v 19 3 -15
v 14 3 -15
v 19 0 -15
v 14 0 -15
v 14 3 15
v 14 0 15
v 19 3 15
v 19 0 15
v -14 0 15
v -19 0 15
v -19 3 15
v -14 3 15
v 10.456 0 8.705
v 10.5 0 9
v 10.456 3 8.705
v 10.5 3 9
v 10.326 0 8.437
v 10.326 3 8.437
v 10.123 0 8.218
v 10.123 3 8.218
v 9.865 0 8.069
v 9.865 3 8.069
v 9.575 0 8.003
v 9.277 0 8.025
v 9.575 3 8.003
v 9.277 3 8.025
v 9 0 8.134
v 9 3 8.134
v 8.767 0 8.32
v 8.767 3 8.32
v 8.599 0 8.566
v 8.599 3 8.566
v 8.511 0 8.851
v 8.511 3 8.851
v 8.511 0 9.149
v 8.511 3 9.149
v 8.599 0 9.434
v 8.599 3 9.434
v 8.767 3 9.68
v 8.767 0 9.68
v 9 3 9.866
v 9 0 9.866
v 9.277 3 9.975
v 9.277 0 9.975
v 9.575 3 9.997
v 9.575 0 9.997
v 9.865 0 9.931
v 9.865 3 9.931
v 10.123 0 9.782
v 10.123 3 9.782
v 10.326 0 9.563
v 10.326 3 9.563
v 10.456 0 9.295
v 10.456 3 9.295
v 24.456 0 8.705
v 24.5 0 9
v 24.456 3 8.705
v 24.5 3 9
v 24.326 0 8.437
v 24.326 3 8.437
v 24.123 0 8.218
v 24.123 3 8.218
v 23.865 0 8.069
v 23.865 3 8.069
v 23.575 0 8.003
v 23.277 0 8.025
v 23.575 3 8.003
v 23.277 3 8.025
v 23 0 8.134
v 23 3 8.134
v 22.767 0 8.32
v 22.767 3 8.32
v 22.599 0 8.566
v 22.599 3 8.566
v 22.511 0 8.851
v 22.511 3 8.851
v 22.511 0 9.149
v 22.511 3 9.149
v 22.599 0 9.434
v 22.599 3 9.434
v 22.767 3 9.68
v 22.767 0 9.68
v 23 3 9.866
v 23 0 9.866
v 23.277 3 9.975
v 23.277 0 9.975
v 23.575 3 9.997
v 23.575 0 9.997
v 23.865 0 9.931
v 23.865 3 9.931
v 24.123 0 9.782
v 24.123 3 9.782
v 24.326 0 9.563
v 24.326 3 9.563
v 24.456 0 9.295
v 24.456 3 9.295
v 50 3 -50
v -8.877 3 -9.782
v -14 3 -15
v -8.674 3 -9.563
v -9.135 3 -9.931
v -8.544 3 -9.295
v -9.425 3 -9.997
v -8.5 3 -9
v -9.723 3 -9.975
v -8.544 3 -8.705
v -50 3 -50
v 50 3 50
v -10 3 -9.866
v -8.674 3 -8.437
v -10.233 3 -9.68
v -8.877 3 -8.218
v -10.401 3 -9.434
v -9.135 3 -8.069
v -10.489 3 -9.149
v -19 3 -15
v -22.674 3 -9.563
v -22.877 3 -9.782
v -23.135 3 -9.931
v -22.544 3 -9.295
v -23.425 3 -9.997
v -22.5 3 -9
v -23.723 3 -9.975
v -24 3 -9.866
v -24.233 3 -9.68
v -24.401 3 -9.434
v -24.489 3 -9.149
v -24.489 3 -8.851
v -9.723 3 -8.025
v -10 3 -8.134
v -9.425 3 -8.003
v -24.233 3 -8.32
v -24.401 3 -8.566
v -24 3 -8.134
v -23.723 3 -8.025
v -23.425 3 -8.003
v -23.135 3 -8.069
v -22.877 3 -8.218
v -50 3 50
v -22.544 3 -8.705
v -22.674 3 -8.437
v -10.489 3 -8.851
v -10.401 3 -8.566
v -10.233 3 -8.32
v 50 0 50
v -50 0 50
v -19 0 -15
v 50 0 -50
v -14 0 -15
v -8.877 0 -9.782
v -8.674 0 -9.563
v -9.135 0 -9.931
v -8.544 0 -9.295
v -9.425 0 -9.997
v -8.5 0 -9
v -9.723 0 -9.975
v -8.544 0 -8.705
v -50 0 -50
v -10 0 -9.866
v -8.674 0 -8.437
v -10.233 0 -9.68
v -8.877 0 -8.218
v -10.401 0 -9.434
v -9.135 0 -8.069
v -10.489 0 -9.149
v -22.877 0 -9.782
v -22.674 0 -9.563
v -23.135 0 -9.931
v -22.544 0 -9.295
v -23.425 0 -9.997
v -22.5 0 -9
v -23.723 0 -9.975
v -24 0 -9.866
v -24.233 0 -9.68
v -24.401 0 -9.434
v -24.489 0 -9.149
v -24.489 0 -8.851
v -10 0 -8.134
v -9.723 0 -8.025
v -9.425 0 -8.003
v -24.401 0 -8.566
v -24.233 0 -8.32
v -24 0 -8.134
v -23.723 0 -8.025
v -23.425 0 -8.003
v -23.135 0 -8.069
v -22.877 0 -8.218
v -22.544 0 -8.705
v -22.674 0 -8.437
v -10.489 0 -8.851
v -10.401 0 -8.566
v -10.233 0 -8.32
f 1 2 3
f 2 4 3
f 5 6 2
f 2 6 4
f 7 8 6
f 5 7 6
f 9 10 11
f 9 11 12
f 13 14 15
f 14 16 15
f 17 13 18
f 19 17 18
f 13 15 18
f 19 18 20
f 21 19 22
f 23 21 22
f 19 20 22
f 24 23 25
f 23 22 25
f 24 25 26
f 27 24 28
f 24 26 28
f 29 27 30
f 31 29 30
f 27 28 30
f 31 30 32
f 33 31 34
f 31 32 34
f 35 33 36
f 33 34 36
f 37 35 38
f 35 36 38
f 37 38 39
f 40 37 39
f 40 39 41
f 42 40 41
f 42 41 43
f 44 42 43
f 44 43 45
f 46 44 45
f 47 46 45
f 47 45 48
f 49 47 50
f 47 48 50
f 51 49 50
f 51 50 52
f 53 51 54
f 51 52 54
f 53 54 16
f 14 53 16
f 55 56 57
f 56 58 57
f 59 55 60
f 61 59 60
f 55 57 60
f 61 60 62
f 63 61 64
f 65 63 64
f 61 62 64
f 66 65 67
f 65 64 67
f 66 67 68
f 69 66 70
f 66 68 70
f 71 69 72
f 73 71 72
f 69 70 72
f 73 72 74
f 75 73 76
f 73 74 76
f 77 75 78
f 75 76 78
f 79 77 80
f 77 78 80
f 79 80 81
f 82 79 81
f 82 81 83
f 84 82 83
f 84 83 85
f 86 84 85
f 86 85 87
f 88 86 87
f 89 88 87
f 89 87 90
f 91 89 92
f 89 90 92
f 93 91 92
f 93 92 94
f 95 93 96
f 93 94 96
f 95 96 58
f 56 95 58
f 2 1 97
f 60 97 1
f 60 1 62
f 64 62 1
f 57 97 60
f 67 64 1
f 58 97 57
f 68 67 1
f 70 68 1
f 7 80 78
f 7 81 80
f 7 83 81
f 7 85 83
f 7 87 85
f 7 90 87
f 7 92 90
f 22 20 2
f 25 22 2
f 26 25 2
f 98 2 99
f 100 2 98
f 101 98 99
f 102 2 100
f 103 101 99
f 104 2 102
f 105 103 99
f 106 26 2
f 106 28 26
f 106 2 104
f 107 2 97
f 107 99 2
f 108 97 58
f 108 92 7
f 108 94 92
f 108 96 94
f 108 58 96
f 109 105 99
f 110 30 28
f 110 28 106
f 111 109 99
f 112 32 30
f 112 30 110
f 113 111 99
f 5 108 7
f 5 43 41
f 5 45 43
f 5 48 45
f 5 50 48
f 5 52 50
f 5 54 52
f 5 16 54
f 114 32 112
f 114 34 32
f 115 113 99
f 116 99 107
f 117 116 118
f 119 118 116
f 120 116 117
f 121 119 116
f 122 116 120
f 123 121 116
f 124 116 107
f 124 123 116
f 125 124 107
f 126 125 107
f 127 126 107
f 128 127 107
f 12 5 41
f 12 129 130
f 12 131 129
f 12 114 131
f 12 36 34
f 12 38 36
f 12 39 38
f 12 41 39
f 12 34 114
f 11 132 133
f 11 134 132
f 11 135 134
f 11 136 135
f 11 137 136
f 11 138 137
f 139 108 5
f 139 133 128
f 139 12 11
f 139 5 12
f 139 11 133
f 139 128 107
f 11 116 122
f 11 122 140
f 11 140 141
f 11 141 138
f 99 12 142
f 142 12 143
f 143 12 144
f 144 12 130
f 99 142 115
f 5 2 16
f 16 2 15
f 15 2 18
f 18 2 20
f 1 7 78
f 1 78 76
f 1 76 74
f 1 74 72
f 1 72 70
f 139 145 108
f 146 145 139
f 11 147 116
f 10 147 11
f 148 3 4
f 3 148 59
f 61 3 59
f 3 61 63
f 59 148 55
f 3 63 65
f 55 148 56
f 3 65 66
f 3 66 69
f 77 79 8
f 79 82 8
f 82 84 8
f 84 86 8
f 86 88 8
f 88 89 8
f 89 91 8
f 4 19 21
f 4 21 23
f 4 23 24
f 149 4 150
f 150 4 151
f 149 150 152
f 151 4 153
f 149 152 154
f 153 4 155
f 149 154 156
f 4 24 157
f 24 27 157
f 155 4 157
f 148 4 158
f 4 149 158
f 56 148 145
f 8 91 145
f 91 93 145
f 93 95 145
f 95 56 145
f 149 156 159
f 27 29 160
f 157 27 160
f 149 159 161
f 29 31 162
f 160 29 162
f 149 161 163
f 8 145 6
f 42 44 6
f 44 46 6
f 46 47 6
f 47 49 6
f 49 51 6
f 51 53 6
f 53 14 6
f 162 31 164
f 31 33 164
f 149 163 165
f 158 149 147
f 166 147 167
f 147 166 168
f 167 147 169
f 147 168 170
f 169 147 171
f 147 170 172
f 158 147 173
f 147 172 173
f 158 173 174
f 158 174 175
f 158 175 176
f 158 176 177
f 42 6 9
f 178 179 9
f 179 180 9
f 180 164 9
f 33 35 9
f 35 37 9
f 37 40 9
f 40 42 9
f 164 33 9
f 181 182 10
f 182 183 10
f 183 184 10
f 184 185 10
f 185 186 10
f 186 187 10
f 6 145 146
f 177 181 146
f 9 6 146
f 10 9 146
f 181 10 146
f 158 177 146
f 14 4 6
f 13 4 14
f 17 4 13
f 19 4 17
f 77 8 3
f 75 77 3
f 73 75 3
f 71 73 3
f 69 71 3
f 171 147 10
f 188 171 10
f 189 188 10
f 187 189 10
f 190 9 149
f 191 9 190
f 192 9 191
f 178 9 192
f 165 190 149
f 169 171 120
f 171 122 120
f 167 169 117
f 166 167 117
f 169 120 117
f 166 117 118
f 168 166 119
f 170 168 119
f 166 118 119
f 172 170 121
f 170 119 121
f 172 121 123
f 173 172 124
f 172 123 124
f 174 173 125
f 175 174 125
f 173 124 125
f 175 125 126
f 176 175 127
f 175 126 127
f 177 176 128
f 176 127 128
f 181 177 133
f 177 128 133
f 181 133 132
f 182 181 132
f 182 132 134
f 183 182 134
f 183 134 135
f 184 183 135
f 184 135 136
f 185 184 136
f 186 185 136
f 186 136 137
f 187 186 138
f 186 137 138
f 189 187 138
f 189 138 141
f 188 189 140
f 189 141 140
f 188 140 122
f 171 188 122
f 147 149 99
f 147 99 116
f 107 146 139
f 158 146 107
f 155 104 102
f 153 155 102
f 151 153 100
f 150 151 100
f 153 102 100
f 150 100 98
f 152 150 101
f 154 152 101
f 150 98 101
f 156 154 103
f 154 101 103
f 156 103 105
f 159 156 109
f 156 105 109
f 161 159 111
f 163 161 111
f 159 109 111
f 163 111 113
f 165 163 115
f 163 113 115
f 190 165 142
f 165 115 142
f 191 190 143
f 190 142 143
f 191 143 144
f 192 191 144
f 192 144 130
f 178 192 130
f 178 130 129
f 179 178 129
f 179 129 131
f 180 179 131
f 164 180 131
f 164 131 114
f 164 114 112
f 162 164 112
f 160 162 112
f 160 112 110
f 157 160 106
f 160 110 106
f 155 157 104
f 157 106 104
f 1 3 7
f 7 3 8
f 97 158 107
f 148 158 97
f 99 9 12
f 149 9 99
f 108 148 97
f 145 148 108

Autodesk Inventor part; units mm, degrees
ref_plane "YZ Plane" through (0, 0, 0) normal (1, 0, 0) x (0, 1, 0)
ref_plane "XZ Plane" through (0, 0, 0) normal (0, 1, 0) x (-1, 0, 0)
ref_plane "XY Plane" through (0, 0, 0) normal (0, 0, 1) x (1, 0, 0)
sketch "Sketch1" plane through (0, 0, 0) normal (0, 1, 0) x (-1, 0, 0)
  line L0 (50, -50) -> (-50, -50)
  line L1 (-50, -50) -> (-50, 50)
  line L2 (-50, 50) -> (50, 50)
  line L3 (50, 50) -> (50, -50)
  line L4 (50, -50) -> (-50, 50) construction
  line L5 (-50, -50) -> (50, 50) construction
  line L6 (-14, -15) -> (-19, -15)
  line L7 (-19, -15) -> (-19, 15)
  line L8 (-19, 15) -> (-14, 15)
  line L9 (-14, 15) -> (-14, -15)
  line L10 (-14, -15) -> (-19, 15) construction
  line L11 (-19, -15) -> (-14, 15) construction
  line L12 (0, -50) -> (0, 50) construction
  line L13 (14, -15) -> (19, -15)
  line L14 (19, -15) -> (19, 15)
  line L15 (19, 15) -> (14, 15)
  line L16 (14, 15) -> (14, -15)
  line L17 (14, -15) -> (19, 15) construction
  line L18 (19, -15) -> (14, 15) construction
  line L19 (-19, 15) -> (-19, 50) construction
  line L20 (-19, -15) -> (-19, -50) construction
  point P0 (0, 0)
  point P1 (-16.5, 0)
  point P2 (16.5, 0)
  dimension "d0" = 100
  dimension "d1" = 100
  dimension "d4" = 5
  dimension "d5" = 30
  dimension "d6" = 14
extrude "Extrusion2" add sketch "Sketch1" along normal blind 3
sketch "Sketch2" plane through (0, 3, 0) normal (0, 1, 0) x (1, 0, 0)
  circle A0 centre (23.5, -9) radius 1
  circle A1 centre (9.5, -9) radius 1
  line L0 (23.5, -9) -> (16.5, -9) construction
  line L1 (19, -15) -> (14, -15) construction
  line L2 (16.5, -15) -> (16.5, -9) construction
  line L3 (16.5, -9) -> (9.5, -9) construction
  line L4 (-19, 15) -> (-14, 15) construction
  line L5 (-16.5, 15) -> (-16.5, 9) construction
  line L6 (-16.5, 9) -> (-9.5, 9) construction
  line L7 (-16.5, 9) -> (-23.5, 9) construction
  circle A2 centre (-9.5, 9) radius 1
  circle A3 centre (-23.5, 9) radius 1
  point P0 (0, 0)
  dimension "d11" = 2
  dimension "d12" = 2
  dimension "d13" = 6
  dimension "d14" = 7
  dimension "d17" = 2
  dimension "d18" = 2
extrude "Extrusion3" cut sketch "Sketch2" against normal through all
properties part number "thumper-bumper-base"
